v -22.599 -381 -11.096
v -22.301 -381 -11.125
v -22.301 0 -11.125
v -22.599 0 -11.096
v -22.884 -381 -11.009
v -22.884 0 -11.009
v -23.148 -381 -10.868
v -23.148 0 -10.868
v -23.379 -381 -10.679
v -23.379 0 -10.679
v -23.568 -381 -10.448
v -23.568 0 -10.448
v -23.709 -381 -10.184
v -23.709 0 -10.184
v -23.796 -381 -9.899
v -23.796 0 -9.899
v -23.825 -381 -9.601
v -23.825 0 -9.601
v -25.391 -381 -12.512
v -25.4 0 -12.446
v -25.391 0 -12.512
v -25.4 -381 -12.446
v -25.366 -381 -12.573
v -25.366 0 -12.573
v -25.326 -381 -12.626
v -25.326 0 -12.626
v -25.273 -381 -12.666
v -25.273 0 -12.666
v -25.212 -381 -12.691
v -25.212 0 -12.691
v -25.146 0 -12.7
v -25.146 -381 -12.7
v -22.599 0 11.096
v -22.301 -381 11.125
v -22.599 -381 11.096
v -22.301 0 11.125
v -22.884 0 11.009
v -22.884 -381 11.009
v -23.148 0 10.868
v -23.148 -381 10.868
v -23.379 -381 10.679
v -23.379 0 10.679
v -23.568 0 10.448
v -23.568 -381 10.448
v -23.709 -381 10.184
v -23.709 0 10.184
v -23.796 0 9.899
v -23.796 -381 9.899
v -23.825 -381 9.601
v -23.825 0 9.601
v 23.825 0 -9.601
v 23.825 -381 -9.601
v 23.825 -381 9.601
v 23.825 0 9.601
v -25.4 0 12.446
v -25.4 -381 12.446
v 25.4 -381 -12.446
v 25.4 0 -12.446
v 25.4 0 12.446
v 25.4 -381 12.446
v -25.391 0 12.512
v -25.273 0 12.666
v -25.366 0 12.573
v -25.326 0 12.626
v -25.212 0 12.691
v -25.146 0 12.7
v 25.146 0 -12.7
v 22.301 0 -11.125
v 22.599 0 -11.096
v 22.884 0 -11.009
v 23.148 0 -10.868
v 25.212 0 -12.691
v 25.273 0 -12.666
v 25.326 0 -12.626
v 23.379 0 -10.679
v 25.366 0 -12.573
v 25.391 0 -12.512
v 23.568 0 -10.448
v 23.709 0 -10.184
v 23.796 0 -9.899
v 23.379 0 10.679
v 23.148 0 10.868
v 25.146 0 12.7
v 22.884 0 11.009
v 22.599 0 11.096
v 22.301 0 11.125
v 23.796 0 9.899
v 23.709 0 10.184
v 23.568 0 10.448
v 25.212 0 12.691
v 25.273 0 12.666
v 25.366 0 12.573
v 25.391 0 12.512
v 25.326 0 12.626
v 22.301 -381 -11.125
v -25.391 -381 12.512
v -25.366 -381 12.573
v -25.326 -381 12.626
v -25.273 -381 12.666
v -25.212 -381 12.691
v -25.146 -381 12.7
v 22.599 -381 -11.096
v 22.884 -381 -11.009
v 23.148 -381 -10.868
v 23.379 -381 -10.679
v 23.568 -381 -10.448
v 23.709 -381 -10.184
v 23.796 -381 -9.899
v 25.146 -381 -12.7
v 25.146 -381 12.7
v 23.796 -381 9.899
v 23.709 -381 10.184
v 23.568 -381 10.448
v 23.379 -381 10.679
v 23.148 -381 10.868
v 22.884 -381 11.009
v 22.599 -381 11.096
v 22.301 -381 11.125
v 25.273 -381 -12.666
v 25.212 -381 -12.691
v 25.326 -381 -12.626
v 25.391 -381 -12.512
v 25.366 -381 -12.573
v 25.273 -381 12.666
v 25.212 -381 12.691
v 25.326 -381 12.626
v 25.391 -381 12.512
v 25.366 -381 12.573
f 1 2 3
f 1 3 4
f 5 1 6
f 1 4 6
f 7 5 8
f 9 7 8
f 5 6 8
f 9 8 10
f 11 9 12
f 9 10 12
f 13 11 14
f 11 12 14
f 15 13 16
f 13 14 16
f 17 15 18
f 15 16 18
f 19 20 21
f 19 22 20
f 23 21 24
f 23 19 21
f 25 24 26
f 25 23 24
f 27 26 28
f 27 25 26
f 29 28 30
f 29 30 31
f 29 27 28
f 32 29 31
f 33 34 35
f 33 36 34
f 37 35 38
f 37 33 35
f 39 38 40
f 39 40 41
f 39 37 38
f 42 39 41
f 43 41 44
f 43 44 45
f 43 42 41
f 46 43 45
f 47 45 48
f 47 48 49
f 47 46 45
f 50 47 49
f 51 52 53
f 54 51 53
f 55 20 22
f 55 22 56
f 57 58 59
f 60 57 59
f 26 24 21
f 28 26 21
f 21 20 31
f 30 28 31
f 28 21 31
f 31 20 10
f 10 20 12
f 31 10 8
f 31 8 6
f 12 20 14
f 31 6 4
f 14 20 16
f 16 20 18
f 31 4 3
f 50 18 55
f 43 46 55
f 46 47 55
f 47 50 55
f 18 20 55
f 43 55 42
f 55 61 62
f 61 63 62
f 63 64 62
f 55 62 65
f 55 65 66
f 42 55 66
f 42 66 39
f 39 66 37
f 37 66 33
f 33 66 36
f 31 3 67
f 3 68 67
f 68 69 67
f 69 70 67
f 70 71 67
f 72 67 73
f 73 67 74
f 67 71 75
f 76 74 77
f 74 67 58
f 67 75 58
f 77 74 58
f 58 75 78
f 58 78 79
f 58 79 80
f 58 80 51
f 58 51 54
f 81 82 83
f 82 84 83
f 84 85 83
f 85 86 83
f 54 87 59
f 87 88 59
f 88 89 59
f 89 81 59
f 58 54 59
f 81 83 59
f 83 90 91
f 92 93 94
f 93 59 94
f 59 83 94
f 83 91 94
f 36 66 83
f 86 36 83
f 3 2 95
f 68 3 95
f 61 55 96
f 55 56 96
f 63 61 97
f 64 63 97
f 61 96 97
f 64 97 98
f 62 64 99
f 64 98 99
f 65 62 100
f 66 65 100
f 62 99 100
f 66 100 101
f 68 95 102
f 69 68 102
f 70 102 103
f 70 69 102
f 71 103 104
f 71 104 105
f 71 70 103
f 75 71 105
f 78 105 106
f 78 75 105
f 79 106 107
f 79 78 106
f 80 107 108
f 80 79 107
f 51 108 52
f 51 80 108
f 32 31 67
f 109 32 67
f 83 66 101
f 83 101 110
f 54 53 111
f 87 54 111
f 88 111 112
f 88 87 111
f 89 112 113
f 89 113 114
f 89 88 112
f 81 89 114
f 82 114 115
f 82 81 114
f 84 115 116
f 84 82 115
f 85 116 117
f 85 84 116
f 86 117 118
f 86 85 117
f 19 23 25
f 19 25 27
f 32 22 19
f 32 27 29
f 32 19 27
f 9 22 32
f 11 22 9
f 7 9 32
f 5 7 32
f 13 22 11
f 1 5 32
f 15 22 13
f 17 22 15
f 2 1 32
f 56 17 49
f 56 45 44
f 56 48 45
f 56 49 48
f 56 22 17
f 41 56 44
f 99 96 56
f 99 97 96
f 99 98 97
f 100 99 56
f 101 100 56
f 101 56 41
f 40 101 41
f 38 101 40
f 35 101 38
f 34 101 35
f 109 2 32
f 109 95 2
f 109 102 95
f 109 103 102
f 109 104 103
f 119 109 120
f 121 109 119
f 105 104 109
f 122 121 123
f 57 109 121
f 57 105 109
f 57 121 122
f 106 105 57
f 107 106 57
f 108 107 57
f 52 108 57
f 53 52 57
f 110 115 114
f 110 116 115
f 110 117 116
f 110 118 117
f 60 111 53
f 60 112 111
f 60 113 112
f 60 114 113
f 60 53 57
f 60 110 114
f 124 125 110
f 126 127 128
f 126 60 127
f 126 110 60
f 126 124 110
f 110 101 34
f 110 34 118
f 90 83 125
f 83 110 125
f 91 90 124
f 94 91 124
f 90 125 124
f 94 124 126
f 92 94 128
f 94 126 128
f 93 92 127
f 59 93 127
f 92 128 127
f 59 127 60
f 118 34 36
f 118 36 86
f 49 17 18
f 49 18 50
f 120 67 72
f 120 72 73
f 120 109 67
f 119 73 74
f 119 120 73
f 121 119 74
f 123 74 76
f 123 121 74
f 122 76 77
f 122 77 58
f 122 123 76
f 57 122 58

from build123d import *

# Parameters (mm, degrees)
F0_W     = 50.8
F0_H     = 25.4
F1_DEPTH = 381
F2_W     = 47.6504
F2_H     = 22.2504
F3_DEPTH = 381
F4_R     = 1.524
F5_R     = 0.254


with BuildPart() as f1:
    # F0 (on Front) → F1 (new body)
    with BuildSketch(Plane.XZ):
        Rectangle(F0_W, F0_H)
    extrude(amount=F1_DEPTH)

    # F2 (on face) → F3 (cut, through all)
    with BuildSketch(Plane.XZ.offset(381)):
        Rectangle(F2_W, F2_H)
    extrude(amount=-F3_DEPTH, mode=Mode.SUBTRACT)

    # F4
    f4_edges = [f1.edges().sort_by_distance(p)[0] for p in [
        (23.8252, -190.5, -11.1252),
        (23.8252, -190.5, 11.1252),
        (-23.8252, -190.5, -11.1252),
        (-23.8252, -190.5, 11.1252),
    ]]
    fillet(f4_edges, radius=F4_R)

    # F5
    f5_edges = [f1.edges().sort_by_distance(p)[0] for p in [
        (-25.4, -190.5, 12.7),
        (25.4, -190.5, 12.7),
        (25.4, -190.5, -12.7),
        (-25.4, -190.5, -12.7),
    ]]
    fillet(f5_edges, radius=F5_R)


solid = f1.part
